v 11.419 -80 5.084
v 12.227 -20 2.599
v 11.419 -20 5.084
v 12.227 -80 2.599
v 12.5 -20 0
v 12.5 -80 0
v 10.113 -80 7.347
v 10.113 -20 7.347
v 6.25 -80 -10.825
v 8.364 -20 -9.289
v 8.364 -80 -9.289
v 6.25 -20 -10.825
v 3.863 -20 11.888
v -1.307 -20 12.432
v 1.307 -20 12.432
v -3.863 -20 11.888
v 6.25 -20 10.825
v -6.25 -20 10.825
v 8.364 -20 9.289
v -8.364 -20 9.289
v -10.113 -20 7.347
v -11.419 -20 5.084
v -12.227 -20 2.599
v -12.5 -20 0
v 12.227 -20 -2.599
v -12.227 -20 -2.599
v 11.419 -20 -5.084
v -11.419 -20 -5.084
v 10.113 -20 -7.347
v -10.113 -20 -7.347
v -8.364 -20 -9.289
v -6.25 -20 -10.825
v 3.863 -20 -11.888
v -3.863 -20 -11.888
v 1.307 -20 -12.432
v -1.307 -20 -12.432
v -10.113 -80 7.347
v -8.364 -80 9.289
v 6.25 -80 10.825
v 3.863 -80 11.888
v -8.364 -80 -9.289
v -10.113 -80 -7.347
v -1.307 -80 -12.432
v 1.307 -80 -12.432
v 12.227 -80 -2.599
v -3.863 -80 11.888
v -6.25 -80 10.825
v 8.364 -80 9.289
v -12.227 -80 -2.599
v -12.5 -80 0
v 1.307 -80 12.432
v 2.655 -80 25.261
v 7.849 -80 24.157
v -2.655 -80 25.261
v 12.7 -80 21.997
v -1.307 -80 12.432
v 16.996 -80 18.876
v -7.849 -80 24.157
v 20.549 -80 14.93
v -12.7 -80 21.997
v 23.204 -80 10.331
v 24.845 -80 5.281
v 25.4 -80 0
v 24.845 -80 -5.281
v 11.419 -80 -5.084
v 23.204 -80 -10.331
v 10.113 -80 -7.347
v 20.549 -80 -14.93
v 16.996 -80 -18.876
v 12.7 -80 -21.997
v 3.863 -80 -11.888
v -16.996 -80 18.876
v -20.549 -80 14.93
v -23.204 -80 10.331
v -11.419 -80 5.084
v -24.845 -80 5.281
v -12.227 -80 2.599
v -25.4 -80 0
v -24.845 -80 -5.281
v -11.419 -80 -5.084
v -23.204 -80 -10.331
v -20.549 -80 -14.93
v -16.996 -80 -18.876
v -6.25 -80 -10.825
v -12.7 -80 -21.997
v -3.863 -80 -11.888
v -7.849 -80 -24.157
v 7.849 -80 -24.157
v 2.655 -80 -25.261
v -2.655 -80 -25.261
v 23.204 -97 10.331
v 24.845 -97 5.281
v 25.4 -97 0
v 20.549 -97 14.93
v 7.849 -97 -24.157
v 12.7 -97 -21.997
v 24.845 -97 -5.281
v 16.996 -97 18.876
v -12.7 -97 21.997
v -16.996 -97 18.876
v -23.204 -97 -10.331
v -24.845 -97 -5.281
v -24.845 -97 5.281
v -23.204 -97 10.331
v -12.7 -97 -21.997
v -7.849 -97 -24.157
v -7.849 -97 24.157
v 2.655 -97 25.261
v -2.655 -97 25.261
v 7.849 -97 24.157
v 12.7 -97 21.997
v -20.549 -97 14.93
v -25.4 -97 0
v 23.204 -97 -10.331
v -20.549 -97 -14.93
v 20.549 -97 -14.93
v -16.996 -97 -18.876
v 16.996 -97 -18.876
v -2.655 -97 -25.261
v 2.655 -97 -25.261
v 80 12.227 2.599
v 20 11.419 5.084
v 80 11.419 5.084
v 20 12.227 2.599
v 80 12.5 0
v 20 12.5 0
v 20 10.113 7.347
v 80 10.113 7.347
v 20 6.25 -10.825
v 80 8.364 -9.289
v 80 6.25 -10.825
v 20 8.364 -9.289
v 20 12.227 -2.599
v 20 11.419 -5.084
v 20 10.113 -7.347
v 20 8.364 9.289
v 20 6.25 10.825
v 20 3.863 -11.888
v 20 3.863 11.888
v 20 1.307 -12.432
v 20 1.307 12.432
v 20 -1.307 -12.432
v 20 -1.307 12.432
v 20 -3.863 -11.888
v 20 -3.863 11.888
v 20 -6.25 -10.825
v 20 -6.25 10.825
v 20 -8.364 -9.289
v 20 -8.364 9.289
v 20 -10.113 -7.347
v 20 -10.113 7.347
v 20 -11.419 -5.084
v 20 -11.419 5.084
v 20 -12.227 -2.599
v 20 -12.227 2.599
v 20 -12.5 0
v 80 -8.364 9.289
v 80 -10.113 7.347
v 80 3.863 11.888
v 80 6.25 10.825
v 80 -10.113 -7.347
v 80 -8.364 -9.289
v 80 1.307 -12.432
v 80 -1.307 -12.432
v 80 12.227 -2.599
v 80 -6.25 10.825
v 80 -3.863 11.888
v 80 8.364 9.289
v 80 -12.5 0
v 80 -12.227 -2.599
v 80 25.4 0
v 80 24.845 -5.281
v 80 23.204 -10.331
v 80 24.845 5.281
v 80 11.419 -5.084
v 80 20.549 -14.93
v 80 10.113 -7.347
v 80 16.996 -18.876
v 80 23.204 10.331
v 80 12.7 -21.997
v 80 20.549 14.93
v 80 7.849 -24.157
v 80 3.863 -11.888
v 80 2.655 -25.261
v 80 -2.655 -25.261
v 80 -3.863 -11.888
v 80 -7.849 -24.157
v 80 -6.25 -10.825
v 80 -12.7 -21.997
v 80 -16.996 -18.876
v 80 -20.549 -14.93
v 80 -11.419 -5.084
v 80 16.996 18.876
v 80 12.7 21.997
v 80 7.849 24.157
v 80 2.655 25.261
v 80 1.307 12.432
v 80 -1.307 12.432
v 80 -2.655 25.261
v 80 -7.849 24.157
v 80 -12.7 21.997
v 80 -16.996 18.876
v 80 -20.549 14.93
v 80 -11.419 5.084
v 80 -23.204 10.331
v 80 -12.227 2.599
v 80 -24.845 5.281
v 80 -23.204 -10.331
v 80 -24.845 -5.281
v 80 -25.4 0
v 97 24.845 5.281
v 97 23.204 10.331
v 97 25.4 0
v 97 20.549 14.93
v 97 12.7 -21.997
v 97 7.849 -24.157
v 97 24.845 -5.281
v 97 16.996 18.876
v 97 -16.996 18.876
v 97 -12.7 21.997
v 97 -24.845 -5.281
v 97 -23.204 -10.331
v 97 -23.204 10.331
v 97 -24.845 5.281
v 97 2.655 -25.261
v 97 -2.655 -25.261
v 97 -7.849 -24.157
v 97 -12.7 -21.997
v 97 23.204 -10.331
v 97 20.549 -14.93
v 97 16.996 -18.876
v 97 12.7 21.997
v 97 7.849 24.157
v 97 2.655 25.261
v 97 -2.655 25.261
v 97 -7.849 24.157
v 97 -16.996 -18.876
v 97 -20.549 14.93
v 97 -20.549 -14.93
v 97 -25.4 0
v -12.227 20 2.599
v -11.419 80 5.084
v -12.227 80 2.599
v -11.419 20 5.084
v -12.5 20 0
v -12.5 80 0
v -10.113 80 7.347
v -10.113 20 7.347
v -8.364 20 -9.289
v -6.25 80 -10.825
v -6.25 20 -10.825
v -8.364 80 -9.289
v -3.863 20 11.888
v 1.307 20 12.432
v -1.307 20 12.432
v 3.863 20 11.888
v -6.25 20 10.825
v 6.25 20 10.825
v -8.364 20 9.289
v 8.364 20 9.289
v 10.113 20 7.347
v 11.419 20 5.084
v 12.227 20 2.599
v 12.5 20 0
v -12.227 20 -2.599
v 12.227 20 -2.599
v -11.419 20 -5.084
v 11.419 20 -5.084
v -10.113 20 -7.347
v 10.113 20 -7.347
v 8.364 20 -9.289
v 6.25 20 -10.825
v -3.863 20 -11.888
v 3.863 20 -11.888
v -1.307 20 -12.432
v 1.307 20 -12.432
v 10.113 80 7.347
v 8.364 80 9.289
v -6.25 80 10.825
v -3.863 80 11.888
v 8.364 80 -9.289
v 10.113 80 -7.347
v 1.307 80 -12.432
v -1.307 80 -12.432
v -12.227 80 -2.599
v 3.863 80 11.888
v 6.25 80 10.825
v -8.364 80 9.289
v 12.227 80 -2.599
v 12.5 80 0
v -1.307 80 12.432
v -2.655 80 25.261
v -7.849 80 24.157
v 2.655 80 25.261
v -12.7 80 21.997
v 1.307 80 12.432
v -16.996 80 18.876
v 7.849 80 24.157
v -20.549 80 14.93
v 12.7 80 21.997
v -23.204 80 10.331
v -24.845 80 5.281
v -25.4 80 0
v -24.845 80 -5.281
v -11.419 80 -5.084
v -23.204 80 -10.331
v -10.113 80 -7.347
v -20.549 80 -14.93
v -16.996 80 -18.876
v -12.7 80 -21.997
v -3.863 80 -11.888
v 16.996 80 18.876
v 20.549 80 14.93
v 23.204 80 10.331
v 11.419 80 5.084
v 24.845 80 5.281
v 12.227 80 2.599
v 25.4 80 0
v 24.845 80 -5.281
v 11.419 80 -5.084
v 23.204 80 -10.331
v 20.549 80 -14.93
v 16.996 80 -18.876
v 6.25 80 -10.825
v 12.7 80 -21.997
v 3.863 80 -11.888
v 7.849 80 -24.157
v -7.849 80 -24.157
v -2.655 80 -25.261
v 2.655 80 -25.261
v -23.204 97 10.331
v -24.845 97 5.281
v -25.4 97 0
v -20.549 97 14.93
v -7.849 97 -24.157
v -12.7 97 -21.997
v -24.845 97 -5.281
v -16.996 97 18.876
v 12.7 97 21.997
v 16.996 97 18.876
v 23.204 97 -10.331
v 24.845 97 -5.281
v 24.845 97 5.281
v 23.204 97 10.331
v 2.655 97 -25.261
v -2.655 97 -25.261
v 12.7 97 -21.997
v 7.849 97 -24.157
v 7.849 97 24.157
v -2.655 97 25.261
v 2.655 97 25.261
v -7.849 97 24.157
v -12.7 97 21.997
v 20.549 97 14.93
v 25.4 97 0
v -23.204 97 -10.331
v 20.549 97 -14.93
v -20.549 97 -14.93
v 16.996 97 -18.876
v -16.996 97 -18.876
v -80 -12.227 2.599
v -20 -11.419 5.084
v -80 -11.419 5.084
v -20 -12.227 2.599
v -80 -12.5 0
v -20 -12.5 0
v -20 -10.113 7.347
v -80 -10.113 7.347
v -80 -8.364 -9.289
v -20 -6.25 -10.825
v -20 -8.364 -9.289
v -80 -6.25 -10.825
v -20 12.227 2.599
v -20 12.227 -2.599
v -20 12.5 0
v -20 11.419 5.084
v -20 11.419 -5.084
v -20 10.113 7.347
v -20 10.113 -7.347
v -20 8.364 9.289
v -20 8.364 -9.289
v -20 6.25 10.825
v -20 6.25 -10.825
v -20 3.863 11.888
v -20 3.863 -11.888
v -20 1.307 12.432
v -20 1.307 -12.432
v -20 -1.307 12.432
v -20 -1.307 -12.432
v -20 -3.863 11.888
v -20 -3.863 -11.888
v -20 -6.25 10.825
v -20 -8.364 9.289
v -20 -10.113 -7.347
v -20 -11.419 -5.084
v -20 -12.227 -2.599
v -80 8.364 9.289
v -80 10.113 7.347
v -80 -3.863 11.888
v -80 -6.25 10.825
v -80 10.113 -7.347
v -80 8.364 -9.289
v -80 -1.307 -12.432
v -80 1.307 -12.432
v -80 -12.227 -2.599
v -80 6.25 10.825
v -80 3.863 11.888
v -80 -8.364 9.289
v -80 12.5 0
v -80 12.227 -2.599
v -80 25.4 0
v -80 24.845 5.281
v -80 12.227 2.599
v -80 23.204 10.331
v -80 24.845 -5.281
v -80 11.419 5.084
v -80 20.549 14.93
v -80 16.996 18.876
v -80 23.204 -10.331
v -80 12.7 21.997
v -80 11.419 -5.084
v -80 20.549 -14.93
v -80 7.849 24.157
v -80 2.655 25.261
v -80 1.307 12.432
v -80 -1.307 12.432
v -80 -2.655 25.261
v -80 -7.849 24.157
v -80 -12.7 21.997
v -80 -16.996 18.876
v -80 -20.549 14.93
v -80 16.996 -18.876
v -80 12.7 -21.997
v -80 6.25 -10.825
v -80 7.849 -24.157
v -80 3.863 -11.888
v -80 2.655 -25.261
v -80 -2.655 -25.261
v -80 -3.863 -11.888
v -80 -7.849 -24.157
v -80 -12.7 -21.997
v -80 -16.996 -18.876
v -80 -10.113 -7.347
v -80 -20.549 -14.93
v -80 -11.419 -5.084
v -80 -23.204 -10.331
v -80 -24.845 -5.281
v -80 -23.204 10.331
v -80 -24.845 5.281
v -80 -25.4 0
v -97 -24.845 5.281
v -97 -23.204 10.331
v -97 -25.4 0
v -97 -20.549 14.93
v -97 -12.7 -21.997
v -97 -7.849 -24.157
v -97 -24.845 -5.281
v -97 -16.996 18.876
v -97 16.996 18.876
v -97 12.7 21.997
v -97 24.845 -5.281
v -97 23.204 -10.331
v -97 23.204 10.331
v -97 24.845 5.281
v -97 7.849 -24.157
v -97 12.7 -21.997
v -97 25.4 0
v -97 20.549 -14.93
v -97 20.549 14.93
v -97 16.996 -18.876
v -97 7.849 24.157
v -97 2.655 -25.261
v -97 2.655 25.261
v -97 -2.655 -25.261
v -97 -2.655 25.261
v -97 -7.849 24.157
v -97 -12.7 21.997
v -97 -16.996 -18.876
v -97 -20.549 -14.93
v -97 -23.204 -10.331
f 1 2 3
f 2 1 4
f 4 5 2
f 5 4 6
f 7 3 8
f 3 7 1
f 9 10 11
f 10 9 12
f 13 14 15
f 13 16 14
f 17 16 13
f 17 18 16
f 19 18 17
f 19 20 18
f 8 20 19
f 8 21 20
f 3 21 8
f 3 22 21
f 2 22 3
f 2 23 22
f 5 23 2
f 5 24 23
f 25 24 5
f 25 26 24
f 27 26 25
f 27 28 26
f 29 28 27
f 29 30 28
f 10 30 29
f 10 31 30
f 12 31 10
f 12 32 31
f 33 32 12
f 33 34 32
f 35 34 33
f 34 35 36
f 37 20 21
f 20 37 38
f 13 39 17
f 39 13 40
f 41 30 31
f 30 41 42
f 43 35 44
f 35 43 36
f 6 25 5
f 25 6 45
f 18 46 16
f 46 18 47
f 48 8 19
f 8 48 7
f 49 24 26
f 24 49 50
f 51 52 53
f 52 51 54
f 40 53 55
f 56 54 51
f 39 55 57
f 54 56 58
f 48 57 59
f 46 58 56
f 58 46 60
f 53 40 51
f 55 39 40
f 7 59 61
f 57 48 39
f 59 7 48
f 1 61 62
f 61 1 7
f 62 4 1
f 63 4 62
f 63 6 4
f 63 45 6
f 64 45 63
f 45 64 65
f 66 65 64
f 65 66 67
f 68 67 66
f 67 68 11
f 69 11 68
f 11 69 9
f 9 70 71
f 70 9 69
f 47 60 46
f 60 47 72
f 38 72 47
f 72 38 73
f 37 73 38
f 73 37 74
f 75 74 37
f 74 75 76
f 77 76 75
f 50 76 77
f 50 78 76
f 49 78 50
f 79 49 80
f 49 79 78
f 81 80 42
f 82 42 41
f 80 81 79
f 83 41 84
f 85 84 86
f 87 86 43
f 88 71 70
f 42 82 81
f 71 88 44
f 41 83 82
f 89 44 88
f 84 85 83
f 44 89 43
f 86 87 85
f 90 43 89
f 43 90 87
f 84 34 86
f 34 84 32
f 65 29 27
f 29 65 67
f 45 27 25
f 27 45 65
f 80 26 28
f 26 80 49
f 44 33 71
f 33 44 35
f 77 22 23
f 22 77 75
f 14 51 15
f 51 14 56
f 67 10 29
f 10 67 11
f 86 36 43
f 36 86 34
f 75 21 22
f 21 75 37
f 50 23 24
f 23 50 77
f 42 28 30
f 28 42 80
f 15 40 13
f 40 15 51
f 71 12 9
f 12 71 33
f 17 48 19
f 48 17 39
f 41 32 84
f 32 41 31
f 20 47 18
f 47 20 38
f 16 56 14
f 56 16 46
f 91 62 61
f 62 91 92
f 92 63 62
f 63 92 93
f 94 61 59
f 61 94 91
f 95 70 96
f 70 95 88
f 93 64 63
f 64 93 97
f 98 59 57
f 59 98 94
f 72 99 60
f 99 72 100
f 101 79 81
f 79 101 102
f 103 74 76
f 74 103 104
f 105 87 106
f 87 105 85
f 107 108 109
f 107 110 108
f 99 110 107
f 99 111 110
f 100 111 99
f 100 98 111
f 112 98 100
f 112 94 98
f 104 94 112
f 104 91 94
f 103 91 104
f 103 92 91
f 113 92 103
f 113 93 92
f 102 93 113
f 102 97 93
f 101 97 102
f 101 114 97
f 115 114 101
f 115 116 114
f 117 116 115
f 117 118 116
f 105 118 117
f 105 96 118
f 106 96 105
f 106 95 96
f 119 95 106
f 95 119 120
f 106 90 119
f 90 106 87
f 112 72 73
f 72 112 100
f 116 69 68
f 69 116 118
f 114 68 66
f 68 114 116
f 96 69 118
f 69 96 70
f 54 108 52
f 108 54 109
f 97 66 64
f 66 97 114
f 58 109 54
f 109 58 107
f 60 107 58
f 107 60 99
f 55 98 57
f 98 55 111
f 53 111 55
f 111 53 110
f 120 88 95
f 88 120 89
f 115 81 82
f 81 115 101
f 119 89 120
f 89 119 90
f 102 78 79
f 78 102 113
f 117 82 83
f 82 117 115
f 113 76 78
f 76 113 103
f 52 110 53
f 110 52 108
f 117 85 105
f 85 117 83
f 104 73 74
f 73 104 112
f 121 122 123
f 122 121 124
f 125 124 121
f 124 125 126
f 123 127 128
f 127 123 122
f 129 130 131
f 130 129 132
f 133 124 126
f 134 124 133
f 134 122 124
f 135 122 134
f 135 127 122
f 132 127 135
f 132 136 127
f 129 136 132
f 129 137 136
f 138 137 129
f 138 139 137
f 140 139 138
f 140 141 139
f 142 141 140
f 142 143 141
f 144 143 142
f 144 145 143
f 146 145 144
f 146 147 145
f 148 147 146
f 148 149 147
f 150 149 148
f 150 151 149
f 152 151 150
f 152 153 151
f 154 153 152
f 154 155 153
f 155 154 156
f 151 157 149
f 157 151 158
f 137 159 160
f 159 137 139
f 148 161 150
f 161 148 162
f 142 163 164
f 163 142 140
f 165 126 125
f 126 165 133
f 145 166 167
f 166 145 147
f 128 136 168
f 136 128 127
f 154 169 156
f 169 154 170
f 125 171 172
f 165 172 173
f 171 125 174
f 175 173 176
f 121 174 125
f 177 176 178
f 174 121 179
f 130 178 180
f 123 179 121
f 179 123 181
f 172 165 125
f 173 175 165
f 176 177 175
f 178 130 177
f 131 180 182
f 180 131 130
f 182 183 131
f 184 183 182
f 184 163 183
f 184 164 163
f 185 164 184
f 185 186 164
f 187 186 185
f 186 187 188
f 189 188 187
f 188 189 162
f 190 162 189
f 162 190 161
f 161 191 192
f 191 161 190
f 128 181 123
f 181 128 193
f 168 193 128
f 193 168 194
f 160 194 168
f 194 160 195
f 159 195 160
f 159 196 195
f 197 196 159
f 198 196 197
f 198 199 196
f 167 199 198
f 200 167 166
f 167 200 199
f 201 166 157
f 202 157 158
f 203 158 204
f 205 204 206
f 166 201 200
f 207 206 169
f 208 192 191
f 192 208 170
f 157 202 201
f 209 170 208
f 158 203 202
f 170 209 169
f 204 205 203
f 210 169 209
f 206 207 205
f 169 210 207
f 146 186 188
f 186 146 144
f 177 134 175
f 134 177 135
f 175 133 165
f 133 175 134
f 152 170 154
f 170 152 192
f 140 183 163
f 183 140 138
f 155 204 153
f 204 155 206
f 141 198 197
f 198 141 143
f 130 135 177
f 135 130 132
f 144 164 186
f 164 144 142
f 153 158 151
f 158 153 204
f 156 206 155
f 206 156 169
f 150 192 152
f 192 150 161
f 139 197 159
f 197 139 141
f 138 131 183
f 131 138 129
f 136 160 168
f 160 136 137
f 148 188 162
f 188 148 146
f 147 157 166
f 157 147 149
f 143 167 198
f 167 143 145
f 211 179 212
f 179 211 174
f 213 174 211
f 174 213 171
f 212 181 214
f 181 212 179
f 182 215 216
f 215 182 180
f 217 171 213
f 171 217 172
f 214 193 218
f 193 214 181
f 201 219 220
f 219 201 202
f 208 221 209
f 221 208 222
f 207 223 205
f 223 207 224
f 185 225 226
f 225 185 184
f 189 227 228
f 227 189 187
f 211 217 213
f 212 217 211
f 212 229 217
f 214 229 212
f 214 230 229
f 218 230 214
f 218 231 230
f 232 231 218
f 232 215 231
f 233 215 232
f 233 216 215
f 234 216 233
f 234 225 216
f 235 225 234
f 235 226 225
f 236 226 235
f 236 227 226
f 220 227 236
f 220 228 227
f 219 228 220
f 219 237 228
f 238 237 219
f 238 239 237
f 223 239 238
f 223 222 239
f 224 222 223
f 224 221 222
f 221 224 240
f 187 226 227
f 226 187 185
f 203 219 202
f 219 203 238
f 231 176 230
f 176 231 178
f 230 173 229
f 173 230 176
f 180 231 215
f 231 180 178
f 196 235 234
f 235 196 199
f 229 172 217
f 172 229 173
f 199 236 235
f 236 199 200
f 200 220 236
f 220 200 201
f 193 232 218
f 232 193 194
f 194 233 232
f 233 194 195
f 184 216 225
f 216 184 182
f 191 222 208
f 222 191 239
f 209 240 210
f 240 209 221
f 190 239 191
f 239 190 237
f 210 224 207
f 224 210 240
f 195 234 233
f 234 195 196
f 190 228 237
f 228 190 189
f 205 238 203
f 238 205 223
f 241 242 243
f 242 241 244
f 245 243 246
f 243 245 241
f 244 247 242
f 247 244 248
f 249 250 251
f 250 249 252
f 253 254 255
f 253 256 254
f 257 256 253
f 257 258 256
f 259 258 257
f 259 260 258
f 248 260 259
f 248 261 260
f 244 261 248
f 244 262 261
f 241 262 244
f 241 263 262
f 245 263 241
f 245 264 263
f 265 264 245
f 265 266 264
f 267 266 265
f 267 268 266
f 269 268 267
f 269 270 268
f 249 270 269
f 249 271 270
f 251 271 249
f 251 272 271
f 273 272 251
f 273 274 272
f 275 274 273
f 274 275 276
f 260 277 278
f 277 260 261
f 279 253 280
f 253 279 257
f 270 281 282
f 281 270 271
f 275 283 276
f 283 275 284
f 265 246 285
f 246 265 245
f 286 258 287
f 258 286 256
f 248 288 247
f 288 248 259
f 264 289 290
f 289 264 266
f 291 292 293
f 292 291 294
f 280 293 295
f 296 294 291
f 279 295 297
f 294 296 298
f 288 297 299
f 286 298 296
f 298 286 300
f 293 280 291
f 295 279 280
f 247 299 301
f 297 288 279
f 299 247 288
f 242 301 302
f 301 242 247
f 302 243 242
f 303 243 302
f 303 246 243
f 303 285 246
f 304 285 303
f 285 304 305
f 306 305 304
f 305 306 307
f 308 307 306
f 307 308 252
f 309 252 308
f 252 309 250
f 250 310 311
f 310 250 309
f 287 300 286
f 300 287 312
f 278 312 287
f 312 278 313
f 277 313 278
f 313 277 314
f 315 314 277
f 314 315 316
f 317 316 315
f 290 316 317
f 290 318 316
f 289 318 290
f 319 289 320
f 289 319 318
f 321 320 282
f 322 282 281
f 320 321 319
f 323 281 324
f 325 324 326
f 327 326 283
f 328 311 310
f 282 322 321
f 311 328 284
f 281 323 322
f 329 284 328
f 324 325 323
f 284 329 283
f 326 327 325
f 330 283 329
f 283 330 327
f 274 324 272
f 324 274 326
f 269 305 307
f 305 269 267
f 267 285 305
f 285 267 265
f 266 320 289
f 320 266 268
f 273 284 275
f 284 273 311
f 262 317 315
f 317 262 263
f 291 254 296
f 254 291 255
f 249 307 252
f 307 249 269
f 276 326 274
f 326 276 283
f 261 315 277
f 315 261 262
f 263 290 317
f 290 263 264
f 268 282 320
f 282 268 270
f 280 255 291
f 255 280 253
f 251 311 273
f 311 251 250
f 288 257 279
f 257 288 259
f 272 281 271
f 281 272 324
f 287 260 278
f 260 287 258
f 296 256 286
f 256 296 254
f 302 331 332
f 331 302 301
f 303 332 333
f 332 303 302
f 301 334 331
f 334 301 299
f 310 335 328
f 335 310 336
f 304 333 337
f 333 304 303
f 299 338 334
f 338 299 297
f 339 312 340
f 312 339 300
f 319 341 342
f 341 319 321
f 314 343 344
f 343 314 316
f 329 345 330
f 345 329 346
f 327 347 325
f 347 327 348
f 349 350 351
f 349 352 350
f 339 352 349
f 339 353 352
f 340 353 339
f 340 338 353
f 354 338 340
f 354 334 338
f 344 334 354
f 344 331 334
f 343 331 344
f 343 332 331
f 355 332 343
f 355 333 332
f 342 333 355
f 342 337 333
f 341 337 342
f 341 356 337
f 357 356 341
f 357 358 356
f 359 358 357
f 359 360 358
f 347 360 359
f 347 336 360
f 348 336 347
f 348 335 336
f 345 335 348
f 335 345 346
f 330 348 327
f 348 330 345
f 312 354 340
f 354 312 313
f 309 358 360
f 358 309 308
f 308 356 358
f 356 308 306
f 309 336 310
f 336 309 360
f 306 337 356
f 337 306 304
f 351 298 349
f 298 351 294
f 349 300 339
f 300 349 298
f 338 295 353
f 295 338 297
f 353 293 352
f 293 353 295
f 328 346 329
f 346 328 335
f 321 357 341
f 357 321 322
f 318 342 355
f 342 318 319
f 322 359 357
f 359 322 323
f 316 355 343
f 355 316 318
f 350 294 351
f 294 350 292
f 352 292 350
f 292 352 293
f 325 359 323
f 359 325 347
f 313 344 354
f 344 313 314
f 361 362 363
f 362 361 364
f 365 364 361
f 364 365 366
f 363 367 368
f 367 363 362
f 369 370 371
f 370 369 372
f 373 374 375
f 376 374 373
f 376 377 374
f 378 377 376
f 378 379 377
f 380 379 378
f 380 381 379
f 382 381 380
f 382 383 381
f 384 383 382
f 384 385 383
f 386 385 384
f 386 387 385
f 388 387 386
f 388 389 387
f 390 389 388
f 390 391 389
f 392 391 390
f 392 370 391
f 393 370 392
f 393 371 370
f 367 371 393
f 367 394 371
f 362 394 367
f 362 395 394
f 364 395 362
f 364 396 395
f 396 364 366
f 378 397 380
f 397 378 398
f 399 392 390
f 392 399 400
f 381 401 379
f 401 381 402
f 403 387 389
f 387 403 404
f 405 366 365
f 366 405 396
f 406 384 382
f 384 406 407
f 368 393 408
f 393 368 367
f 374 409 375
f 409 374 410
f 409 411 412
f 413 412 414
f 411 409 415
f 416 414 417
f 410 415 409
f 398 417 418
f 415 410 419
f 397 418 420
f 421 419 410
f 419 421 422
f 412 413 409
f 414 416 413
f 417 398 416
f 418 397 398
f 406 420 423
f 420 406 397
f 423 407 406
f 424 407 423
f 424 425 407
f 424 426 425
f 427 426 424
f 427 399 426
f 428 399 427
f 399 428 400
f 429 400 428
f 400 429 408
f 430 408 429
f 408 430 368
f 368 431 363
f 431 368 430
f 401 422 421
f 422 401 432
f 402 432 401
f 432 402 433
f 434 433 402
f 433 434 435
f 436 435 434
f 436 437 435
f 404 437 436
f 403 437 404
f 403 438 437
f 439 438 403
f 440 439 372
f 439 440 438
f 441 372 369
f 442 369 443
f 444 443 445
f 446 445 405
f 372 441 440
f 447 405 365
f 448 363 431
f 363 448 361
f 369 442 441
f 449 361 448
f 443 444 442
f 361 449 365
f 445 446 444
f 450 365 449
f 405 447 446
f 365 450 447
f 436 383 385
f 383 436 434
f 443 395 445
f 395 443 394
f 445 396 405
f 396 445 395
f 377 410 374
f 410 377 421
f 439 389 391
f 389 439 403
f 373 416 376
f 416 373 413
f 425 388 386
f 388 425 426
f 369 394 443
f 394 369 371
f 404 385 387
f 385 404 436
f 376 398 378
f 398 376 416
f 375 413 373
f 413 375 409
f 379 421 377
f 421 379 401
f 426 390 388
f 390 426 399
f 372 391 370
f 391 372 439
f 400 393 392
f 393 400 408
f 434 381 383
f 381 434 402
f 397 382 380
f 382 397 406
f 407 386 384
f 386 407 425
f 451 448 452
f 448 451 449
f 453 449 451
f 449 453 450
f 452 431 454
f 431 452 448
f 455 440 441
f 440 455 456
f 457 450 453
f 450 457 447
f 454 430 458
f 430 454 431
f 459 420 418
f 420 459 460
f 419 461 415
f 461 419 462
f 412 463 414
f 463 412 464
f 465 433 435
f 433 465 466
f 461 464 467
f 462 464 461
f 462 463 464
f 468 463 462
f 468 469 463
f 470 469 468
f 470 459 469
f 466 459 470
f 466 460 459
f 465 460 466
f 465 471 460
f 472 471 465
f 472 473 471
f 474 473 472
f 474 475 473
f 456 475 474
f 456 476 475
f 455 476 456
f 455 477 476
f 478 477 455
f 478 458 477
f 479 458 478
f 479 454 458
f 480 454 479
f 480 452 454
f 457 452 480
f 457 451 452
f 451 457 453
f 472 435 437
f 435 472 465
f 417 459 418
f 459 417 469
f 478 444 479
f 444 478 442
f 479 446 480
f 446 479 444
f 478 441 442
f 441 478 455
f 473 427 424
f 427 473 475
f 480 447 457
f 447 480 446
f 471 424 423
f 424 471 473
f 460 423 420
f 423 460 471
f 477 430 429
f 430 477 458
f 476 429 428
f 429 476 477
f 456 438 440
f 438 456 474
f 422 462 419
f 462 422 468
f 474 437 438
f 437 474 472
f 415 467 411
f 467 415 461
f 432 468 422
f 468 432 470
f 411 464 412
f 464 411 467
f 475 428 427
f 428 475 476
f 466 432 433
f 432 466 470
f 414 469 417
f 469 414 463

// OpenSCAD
module wheel(){
    thick = 17;  // mm
    dia = 50.8;
    cylinder(h=thick, d=dia);
}

module motor(){
    cylinder(h=60, d=25);
}

module mw(angle){
    rotate([90,0,angle]){
        motor();
        translate([0,0,60]) wheel();
    }
}

translate([0,-20,0]) mw(0);
translate([20,0,0]) mw(90);
translate([0,20,0]) mw(180);
translate([-20,0,0]) mw(270);
